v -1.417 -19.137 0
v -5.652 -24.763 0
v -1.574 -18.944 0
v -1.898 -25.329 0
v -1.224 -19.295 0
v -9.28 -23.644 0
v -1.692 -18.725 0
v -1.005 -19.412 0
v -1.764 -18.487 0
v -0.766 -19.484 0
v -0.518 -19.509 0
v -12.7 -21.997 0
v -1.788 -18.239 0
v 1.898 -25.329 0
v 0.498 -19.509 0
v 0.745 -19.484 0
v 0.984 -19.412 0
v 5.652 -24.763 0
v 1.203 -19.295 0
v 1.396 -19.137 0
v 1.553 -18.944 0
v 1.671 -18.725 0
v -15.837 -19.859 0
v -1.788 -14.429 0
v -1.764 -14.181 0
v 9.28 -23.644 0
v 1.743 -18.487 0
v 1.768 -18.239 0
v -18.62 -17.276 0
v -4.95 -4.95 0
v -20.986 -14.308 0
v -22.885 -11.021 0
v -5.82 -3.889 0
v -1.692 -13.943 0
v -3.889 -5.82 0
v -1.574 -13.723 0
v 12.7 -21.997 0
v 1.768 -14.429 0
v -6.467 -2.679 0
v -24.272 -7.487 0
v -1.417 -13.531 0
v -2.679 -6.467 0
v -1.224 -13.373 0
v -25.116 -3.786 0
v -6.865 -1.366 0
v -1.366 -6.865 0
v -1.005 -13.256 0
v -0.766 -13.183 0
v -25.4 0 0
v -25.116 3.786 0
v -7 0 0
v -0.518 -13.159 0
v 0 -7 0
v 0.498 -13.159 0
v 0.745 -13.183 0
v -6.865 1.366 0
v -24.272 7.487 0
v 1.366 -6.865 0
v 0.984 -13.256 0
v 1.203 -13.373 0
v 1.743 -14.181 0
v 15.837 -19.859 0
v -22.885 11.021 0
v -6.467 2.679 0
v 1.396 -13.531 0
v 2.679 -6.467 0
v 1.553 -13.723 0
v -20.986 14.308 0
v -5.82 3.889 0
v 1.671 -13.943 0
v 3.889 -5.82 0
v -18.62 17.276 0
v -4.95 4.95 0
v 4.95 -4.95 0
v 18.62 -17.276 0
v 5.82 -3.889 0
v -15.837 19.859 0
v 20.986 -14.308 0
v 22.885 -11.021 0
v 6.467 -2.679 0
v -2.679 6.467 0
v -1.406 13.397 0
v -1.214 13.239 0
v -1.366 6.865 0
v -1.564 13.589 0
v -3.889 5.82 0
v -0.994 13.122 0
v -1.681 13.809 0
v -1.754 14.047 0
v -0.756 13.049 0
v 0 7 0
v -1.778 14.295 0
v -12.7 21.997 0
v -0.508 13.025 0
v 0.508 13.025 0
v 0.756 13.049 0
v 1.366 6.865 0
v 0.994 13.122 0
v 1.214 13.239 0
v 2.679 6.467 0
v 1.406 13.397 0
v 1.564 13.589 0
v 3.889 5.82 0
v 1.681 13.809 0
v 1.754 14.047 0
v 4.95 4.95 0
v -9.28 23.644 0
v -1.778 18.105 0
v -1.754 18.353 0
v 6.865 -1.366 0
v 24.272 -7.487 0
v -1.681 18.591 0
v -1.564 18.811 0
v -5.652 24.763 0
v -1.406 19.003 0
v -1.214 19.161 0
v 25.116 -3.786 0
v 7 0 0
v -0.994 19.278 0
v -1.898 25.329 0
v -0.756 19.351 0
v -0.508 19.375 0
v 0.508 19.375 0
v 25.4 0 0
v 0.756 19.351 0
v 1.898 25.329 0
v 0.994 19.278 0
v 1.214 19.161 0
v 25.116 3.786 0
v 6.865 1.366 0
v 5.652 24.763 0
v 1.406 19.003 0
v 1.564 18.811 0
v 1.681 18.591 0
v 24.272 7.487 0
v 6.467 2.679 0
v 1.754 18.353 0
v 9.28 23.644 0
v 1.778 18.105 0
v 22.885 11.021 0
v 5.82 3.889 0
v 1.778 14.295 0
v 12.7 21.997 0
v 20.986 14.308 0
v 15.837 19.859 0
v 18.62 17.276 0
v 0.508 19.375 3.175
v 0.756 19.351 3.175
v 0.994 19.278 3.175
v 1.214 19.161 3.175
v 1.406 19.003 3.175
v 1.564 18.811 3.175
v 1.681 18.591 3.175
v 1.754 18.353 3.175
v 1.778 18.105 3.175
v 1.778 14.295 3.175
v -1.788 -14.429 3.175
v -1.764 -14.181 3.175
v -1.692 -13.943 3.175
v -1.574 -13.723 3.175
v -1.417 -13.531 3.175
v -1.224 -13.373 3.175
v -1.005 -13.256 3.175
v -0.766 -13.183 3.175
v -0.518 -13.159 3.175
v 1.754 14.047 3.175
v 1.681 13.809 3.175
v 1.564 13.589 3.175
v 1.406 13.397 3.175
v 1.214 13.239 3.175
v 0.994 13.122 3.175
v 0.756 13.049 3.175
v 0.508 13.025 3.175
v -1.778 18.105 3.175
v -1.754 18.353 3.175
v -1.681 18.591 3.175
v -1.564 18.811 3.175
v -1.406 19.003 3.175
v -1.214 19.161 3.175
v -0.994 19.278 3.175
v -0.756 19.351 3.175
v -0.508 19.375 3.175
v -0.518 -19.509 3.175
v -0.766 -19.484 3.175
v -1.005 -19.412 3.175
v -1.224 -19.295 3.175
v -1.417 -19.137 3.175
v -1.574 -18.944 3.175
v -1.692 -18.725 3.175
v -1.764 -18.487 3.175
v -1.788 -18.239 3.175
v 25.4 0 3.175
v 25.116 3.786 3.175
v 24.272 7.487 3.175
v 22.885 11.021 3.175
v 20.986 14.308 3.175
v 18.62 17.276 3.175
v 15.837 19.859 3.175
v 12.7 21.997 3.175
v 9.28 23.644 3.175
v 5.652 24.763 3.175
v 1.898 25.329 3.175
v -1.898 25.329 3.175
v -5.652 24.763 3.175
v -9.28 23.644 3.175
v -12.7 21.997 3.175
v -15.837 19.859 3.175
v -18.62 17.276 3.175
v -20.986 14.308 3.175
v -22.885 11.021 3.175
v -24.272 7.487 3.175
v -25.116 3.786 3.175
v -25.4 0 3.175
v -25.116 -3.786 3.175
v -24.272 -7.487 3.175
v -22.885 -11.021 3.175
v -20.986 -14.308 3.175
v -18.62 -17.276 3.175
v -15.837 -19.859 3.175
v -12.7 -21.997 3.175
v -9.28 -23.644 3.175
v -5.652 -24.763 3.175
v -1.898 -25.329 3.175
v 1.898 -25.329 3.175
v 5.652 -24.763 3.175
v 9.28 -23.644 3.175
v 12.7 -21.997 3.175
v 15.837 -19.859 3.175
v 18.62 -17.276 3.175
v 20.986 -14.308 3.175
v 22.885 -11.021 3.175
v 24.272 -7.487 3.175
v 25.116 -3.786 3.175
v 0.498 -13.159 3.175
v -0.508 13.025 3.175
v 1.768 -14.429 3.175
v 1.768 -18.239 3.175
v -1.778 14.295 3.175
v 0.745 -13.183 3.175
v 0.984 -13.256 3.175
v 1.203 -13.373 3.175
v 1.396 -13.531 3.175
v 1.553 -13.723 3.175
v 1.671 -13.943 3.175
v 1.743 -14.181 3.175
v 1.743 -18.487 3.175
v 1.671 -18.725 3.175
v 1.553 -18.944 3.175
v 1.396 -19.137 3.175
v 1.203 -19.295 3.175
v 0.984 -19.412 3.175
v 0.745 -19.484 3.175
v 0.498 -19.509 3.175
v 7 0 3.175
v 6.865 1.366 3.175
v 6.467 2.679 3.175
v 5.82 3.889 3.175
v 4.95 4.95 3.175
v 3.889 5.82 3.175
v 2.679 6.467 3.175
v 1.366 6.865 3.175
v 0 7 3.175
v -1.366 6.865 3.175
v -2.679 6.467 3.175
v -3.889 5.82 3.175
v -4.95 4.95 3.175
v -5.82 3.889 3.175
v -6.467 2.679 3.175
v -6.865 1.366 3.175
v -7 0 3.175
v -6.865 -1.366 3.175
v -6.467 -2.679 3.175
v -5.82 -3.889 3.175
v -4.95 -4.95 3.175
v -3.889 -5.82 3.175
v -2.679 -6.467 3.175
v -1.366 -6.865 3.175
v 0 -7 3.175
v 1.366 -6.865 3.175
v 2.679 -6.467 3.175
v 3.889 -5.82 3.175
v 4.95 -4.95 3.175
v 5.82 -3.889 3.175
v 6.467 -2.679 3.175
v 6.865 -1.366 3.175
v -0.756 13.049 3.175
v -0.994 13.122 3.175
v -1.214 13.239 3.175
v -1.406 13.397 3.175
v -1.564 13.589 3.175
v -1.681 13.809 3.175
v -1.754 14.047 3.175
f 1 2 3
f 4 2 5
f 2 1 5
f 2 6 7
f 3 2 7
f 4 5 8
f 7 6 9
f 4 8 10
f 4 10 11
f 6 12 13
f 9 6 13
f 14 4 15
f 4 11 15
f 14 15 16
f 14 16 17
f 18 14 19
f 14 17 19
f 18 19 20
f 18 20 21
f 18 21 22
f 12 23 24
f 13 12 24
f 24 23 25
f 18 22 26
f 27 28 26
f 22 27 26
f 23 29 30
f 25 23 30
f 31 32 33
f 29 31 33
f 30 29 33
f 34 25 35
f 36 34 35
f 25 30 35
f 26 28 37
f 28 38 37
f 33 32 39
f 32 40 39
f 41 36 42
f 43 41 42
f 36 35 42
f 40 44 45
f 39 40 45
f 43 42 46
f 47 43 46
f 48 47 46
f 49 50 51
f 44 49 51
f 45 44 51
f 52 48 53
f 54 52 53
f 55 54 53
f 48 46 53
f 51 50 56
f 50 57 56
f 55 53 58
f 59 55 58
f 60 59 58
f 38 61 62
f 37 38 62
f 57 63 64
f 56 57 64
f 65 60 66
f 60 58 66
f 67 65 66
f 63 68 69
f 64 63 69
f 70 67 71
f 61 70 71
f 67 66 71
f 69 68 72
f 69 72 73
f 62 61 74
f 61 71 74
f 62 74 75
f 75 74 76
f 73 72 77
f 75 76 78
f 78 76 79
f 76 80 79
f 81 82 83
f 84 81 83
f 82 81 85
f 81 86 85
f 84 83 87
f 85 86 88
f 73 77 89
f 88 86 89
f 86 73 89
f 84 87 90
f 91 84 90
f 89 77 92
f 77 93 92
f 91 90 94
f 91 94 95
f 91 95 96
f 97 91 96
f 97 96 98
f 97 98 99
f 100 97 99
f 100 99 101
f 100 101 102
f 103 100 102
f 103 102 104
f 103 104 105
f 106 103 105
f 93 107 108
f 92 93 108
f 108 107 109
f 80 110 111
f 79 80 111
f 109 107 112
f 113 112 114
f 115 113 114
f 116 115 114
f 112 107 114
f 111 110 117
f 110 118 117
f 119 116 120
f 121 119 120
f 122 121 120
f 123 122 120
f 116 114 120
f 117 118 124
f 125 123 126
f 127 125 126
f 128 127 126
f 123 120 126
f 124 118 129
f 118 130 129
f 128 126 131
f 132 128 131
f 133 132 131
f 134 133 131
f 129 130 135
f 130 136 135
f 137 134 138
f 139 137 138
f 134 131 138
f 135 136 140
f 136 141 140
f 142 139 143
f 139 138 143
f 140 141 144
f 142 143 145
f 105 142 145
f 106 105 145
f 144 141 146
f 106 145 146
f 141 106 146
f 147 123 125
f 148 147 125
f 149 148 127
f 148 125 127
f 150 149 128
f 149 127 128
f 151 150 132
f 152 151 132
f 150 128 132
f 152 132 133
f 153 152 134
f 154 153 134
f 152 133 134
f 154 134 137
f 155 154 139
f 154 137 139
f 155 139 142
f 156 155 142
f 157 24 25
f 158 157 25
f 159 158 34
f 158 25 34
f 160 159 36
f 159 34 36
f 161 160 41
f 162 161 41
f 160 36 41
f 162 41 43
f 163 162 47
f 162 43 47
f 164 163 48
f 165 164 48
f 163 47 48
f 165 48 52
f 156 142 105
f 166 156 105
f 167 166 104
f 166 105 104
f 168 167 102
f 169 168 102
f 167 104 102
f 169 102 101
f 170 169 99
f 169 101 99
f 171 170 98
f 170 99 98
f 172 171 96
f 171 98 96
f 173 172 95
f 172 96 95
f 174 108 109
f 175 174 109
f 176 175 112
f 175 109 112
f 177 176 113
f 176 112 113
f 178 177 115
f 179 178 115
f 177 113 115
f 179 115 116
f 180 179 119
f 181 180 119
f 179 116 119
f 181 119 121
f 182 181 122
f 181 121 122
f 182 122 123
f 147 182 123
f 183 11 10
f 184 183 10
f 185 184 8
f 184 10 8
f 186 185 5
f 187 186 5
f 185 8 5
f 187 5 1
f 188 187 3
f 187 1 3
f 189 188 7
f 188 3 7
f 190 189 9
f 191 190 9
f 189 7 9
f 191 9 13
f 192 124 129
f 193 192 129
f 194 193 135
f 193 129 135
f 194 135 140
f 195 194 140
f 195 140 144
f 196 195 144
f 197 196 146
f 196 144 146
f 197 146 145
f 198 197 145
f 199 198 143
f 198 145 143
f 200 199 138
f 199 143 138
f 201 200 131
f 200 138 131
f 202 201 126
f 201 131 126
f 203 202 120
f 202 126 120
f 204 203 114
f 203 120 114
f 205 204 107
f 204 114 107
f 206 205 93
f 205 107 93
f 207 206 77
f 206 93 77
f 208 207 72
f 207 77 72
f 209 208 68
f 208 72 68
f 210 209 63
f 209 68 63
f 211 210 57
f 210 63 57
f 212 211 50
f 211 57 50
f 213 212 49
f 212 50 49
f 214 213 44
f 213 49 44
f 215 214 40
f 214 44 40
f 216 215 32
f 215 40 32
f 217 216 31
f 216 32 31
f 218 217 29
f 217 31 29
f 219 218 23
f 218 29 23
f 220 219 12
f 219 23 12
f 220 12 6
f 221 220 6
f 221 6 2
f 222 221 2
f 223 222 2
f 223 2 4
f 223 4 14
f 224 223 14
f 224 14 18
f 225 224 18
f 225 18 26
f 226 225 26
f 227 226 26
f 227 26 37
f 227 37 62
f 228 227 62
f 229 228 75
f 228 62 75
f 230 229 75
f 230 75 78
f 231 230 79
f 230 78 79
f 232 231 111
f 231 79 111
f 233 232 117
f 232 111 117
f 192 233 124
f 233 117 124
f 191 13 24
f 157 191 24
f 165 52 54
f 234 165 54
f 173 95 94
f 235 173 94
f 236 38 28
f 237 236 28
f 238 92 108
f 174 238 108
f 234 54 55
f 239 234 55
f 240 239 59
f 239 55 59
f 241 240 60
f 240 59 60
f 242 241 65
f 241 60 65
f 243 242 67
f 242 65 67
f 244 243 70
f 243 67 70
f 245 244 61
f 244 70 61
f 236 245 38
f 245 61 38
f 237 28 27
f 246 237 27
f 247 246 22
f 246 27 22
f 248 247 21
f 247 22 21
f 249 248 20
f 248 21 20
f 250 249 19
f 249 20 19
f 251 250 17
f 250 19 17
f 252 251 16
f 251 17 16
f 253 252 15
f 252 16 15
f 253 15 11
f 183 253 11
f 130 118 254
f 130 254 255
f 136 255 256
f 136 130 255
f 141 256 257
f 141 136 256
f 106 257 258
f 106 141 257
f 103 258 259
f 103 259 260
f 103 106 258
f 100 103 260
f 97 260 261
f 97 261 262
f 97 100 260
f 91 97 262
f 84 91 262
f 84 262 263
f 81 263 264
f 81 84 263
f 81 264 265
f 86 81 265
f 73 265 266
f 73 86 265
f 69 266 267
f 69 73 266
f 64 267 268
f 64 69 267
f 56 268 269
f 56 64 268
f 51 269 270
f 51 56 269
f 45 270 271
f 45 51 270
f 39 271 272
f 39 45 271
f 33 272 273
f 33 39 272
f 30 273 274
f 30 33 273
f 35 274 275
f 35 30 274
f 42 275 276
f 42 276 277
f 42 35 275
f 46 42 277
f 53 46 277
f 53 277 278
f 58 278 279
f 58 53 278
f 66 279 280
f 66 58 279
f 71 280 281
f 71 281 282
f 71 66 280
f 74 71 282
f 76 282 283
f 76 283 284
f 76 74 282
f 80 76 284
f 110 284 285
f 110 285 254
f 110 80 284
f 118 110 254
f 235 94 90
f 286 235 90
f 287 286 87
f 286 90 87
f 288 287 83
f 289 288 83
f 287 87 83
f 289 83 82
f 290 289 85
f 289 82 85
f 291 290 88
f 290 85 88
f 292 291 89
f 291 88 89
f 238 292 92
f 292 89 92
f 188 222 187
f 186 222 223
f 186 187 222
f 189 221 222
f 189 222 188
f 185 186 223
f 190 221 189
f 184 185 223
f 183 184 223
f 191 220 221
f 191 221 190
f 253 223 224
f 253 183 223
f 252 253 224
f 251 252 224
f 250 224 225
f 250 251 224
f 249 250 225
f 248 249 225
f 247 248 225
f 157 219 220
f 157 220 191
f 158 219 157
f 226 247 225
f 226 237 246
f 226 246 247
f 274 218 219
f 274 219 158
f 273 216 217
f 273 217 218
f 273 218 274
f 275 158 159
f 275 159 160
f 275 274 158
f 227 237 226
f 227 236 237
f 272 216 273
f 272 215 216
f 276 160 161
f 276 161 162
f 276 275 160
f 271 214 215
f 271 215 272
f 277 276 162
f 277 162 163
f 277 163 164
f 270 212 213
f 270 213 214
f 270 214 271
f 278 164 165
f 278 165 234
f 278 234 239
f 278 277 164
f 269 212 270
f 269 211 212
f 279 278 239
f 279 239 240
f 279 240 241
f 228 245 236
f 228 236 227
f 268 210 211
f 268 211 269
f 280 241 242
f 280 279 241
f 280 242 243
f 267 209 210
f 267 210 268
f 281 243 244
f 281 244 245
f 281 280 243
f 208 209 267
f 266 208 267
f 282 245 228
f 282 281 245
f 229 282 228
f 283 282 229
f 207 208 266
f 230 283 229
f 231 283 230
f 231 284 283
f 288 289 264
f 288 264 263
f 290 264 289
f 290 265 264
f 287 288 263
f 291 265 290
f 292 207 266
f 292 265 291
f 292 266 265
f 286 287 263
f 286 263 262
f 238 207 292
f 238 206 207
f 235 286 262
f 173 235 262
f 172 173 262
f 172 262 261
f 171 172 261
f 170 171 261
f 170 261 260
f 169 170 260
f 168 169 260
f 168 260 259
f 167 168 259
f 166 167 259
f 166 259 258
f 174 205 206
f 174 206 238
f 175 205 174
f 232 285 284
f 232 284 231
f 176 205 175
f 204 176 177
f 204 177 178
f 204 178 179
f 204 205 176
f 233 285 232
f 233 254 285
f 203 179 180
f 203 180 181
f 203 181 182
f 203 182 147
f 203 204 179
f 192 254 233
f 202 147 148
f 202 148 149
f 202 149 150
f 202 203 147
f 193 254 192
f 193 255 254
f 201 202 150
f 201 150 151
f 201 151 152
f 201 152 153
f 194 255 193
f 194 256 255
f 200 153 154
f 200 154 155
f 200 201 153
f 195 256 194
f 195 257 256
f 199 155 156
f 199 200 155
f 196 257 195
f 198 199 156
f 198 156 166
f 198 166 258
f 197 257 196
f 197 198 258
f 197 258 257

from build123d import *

# Parameters (mm, degrees)
F0_R     = 25.4
F0_R_2   = 7
F1_DEPTH = 3.175


with BuildPart() as f1:
    # F0 (on Top) → F1 (new body)
    with BuildSketch(Plane.XY):
        Circle(F0_R)
        with BuildLine():
            Line((-0.518496, -13.15886), (0.497504, -13.15886))
            ThreePointArc((0.497504, -13.15886), (1.39553, -13.530834), (1.767504, -14.42886))
            Line((1.767504, -14.42886), (1.767504, -18.23886))
            ThreePointArc((1.767504, -18.23886), (1.39553, -19.136886), (0.497504, -19.50886))
            Line((0.497504, -19.50886), (-0.518496, -19.50886))
            ThreePointArc((-0.518496, -19.50886), (-1.416522, -19.136886), (-1.788496, -18.23886))
            Line((-1.788496, -18.23886), (-1.788496, -14.42886))
            ThreePointArc((-1.788496, -14.42886), (-1.416522, -13.530834), (-0.518496, -13.15886))
        make_face(mode=Mode.SUBTRACT)
        Circle(F0_R_2, mode=Mode.SUBTRACT)
        with BuildLine():
            Line((-0.508, 19.375), (0.508, 19.375))
            ThreePointArc((0.508, 19.375), (1.406026, 19.003026), (1.778, 18.105))
            Line((1.778, 18.105), (1.778, 14.295))
            ThreePointArc((1.778, 14.295), (1.406026, 13.396974), (0.508, 13.025))
            Line((0.508, 13.025), (-0.508, 13.025))
            ThreePointArc((-0.508, 13.025), (-1.406026, 13.396974), (-1.778, 14.295))
            Line((-1.778, 14.295), (-1.778, 18.105))
            ThreePointArc((-1.778, 18.105), (-1.406026, 19.003026), (-0.508, 19.375))
        make_face(mode=Mode.SUBTRACT)
    extrude(amount=F1_DEPTH)


solid = f1.part
